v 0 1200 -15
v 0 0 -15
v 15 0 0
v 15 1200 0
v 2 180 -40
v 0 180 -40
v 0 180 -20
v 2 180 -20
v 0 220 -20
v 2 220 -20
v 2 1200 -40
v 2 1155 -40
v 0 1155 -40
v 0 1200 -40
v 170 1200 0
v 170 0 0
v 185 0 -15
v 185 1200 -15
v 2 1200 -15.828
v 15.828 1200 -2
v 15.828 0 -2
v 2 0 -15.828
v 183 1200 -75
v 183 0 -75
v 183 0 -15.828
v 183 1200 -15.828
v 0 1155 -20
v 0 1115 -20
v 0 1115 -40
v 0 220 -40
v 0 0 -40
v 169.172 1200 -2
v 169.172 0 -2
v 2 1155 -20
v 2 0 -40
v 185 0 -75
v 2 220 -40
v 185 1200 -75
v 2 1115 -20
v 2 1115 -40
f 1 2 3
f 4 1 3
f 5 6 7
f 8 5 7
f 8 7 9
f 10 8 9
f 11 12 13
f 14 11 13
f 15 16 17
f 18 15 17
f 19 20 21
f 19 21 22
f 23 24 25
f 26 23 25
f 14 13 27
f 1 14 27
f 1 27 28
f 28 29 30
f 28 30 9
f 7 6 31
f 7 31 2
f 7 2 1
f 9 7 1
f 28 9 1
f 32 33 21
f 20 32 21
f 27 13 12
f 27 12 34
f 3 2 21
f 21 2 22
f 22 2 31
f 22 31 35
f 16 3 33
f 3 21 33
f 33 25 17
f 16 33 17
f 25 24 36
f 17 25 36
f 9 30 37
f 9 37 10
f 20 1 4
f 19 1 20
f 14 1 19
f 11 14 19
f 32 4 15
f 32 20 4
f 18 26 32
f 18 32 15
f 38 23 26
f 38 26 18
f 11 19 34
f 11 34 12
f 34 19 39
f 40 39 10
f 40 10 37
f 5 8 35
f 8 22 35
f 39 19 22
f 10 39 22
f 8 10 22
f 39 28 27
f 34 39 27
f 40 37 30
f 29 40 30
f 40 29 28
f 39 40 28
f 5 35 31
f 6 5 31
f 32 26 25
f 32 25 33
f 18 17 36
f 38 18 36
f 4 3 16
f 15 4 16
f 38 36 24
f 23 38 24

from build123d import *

# Parameters (mm, degrees)
BOSS_EXTRUDE1_DEPTH = 1200
CUT_EXTRUDE1_REACH  = 187
SKETCH2_W           = 20
SKETCH2_H           = 40


with BuildPart() as part:
    # Sketch1 → Boss-Extrude1 (new body)
    with BuildSketch(Plane(origin=(0, 0, 0), x_dir=(1, 0, 0), z_dir=(0, 1, 0))):
        Polygon((15.828427125, 2), (2, 15.828427125), (2, 40), (0, 40), (0, 15), (15, 0), (170, 0), (185, 15), (185, 75), (183, 75), (183, 15.828427125), (169.171572875, 2), align=None)
    extrude(amount=BOSS_EXTRUDE1_DEPTH)

    # Sketch2 → Cut-Extrude1 (cut, up to next)
    with BuildSketch(Plane.ZY, mode=Mode.PRIVATE) as cut_extrude1_sk1:
        with Locations((-30, 200)):
            Rectangle(SKETCH2_W, SKETCH2_H)
    cut_extrude1_tool1 = extrude(cut_extrude1_sk1.sketch, amount=-CUT_EXTRUDE1_REACH, mode=Mode.PRIVATE) & part.part
    add(cut_extrude1_tool1.solids().sort_by_distance((0, 200, -30))[0], mode=Mode.SUBTRACT)
    # Sketch2 → Cut-Extrude1 (cut, up to next)
    with BuildSketch(Plane.ZY, mode=Mode.PRIVATE) as cut_extrude1_sk2:
        with Locations((-30, 1135)):
            Rectangle(SKETCH2_W, SKETCH2_H)
    cut_extrude1_tool2 = extrude(cut_extrude1_sk2.sketch, amount=-CUT_EXTRUDE1_REACH, mode=Mode.PRIVATE) & part.part
    add(cut_extrude1_tool2.solids().sort_by_distance((0, 1135, -30))[0], mode=Mode.SUBTRACT)


solid = part.part
